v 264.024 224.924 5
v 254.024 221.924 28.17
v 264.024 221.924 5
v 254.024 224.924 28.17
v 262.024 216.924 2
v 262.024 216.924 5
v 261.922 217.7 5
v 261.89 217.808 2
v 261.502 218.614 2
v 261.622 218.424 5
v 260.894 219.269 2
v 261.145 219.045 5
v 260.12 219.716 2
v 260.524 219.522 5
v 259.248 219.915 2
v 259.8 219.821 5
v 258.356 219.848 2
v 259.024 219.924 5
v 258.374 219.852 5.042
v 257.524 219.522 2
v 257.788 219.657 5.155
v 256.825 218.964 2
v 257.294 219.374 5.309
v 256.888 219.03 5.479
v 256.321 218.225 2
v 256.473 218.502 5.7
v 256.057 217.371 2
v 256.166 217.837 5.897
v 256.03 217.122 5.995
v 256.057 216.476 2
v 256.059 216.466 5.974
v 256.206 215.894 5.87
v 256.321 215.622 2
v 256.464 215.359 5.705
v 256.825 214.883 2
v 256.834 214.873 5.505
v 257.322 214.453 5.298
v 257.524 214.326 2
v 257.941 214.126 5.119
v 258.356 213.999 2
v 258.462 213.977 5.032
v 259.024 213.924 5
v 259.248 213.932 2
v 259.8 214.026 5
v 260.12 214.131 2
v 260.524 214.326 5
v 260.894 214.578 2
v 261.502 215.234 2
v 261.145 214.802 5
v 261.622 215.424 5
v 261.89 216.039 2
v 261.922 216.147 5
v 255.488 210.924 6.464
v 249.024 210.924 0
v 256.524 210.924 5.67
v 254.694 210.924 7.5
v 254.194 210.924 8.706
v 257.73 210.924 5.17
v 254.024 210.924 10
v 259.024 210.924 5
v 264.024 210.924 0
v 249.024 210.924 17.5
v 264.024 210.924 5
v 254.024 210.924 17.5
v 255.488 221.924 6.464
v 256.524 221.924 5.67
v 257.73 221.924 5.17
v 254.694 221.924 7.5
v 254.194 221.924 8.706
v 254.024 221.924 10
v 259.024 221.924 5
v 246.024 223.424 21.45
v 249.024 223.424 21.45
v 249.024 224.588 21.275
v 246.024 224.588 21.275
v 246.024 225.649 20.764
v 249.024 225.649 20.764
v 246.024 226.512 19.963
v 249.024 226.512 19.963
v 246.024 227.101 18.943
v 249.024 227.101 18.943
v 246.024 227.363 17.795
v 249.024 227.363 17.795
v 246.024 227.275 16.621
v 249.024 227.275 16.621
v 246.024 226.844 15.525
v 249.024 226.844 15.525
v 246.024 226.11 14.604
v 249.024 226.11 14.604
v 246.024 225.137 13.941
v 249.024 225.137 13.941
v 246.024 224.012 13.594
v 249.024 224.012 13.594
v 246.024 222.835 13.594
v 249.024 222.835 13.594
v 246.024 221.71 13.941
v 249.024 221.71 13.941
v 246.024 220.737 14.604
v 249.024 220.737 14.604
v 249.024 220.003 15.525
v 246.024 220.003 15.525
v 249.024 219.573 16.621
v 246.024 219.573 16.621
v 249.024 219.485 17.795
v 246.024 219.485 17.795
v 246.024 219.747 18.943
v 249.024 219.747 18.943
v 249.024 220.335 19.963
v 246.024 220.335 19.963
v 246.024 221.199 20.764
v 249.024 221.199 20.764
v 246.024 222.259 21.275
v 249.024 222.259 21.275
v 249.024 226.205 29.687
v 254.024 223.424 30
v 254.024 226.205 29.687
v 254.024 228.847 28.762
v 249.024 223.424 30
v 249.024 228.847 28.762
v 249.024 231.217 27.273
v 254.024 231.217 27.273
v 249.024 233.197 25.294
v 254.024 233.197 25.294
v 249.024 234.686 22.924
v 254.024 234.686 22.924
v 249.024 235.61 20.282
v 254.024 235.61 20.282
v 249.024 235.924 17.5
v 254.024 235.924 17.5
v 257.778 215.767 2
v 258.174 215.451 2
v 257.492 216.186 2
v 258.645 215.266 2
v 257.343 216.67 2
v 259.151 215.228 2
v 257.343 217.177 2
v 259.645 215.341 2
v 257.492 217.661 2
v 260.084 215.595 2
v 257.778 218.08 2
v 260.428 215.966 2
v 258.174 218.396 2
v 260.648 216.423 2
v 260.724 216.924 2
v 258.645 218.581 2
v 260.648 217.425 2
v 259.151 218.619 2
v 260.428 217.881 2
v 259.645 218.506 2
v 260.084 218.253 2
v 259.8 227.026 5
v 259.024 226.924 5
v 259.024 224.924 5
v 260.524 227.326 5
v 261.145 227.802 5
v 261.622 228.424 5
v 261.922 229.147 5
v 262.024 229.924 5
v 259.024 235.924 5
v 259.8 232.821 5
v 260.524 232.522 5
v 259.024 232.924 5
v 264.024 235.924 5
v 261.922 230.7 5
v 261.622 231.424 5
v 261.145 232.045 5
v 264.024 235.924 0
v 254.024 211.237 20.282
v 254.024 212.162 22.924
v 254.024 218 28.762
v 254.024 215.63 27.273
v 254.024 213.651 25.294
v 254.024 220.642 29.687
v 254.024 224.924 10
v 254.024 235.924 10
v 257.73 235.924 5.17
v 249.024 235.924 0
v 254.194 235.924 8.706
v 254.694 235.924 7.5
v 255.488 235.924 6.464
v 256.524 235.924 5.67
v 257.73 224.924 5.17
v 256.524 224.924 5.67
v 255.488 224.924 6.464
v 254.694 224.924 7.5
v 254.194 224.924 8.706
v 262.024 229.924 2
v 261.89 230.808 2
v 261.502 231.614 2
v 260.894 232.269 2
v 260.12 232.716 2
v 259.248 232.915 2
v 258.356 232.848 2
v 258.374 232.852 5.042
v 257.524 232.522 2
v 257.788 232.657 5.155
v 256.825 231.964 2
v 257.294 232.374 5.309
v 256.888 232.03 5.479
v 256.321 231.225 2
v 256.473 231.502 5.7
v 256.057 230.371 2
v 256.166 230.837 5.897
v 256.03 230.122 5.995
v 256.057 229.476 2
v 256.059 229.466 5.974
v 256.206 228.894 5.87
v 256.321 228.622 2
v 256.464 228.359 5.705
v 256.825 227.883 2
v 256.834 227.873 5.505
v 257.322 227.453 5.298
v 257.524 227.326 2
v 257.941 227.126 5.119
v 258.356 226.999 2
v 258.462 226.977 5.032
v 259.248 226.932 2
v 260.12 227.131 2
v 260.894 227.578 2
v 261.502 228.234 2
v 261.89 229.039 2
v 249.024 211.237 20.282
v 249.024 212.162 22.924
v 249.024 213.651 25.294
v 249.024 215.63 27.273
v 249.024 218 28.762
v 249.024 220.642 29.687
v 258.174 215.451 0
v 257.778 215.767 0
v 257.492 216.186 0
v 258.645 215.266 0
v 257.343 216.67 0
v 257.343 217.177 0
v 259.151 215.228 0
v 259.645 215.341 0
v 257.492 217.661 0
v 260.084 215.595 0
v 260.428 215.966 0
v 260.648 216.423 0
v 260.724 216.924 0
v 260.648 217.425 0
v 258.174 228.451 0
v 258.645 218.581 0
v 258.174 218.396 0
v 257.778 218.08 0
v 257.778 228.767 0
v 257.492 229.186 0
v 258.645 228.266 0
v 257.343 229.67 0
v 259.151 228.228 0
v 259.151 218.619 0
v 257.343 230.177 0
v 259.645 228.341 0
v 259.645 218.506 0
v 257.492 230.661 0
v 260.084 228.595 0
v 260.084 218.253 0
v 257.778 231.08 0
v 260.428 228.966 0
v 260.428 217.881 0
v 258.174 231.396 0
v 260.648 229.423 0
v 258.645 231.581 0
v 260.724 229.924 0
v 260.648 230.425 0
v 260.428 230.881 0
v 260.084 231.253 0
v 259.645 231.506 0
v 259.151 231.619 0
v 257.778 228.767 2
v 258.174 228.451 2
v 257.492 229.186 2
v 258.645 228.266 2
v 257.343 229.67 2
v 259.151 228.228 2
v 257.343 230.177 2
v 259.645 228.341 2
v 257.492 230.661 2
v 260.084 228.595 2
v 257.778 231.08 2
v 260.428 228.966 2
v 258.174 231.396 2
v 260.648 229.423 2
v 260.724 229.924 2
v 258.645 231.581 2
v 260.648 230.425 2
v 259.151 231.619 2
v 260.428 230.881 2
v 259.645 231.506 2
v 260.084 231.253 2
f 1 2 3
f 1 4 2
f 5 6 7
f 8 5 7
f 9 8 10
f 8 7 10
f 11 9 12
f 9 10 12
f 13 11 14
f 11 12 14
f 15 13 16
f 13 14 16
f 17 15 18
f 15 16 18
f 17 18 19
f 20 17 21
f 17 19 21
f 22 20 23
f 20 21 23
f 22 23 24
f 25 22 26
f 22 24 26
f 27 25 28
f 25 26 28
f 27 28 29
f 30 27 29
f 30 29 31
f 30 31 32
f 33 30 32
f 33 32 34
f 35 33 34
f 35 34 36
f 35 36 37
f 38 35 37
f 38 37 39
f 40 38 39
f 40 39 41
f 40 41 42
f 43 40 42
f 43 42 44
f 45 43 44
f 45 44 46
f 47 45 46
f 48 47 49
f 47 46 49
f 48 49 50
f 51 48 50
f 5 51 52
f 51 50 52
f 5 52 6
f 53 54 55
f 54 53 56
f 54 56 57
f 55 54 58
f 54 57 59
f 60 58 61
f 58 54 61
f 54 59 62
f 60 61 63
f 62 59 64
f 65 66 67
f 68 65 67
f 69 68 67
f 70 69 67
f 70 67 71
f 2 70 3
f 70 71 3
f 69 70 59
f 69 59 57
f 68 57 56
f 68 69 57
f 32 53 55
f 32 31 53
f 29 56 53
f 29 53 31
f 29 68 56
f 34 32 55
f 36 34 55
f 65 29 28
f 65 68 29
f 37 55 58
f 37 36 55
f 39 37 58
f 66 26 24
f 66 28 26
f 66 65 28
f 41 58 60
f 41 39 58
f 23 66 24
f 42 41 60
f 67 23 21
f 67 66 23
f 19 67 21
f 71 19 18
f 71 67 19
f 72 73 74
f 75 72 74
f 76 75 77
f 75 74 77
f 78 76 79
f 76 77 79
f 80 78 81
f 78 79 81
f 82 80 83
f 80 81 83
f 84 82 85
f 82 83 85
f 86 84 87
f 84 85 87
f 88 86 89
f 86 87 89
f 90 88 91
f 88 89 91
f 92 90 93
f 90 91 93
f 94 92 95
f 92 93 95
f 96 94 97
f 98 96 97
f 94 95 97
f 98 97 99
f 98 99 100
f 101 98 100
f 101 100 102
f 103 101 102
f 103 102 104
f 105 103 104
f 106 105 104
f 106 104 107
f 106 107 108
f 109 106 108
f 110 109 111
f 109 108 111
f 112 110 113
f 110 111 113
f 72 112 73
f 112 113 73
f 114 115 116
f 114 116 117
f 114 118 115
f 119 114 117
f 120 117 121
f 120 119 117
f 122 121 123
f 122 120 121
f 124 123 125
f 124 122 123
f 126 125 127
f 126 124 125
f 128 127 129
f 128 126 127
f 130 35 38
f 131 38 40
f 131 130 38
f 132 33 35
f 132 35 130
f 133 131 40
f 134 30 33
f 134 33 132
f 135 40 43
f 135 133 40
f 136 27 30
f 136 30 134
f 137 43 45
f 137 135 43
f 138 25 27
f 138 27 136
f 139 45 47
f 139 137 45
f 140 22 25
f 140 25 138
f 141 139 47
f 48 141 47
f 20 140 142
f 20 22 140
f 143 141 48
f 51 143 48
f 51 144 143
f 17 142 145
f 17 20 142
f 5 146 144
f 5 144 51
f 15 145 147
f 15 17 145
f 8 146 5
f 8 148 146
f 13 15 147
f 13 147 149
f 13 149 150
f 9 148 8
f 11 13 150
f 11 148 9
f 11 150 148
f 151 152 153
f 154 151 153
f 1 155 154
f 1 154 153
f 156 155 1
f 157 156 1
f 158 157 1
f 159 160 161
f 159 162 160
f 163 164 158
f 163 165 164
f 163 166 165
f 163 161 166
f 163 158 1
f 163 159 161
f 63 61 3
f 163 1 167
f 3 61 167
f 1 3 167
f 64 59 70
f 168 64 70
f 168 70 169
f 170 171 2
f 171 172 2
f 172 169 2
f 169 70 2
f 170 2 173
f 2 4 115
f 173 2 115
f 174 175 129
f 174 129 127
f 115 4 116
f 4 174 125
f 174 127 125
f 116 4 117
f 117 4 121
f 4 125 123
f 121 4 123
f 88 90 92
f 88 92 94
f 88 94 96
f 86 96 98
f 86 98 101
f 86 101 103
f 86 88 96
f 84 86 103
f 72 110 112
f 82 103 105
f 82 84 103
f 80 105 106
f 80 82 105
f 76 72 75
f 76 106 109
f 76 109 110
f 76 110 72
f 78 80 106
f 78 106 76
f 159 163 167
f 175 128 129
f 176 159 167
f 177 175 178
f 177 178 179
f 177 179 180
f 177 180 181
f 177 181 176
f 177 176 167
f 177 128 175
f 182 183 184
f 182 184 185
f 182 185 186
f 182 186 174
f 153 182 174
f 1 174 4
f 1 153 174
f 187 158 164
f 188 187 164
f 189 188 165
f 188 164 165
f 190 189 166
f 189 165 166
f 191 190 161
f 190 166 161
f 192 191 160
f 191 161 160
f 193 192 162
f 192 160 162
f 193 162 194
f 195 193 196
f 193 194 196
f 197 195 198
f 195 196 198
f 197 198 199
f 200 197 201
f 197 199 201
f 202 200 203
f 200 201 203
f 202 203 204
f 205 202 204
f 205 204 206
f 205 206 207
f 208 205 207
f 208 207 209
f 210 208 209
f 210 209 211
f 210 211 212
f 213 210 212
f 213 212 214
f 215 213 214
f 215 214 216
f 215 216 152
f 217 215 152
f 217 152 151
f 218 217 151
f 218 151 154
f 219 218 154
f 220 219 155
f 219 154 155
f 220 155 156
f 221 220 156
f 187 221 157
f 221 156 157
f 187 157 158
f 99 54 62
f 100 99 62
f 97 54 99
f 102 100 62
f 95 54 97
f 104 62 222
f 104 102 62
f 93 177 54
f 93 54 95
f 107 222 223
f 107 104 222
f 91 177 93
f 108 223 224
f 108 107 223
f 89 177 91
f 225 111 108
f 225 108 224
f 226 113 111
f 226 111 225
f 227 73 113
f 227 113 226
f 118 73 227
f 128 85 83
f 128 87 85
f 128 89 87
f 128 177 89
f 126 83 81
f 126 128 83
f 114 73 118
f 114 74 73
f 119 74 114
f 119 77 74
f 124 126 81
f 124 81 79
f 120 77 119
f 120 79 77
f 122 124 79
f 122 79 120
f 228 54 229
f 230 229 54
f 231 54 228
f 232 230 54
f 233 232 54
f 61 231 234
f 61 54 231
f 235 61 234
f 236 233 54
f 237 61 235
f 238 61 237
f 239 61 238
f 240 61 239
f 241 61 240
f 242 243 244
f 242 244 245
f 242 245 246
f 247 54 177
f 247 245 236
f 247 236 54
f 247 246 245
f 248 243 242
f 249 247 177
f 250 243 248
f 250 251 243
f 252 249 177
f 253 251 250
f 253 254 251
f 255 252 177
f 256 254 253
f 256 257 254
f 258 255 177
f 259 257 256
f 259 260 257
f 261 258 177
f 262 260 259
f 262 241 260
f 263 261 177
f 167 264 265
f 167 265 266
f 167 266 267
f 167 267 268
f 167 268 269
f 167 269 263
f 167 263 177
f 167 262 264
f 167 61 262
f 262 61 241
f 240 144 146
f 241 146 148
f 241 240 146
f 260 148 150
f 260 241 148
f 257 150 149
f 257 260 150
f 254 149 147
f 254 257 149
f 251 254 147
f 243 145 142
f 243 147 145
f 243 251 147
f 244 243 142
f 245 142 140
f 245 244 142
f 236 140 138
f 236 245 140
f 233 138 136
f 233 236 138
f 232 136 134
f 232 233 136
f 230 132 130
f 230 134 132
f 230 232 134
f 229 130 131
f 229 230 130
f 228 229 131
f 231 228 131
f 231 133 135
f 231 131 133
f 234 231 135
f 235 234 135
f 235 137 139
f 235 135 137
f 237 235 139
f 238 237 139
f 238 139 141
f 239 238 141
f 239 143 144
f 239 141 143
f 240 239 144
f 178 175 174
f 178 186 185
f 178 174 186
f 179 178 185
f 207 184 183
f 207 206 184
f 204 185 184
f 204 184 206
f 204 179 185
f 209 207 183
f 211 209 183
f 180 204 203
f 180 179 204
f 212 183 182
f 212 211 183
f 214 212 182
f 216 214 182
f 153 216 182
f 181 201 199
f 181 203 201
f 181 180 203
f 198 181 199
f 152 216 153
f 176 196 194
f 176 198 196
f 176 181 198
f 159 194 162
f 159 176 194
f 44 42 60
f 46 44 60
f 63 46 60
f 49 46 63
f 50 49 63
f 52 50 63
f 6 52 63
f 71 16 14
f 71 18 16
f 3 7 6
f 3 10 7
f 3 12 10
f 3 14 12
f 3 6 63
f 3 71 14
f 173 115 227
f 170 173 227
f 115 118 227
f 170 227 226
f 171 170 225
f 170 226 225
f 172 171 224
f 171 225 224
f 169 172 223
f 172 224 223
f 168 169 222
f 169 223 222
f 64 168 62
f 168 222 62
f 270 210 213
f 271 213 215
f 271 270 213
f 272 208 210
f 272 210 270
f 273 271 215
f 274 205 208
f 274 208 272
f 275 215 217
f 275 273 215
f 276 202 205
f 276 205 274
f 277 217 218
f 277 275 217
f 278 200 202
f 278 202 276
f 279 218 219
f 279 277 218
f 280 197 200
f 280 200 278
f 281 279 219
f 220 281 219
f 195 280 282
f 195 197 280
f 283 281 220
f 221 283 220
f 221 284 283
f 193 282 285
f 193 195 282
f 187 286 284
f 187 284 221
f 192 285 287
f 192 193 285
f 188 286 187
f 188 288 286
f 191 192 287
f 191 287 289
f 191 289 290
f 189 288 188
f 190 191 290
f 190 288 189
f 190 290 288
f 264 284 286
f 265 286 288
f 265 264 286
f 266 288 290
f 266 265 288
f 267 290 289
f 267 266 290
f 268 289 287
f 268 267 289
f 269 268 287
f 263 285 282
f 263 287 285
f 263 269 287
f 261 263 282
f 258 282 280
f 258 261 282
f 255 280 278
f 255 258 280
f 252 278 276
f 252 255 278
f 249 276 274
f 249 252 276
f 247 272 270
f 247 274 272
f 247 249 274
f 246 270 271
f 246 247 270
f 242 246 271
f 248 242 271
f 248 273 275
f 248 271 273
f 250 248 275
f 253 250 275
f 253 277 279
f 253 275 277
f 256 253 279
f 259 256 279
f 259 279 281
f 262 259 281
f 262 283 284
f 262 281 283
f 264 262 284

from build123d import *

# Parameters (mm, degrees)
SKETCH1_W           = 10
SKETCH1_H           = 25
SKETCH1_R           = 1.7
BOSS_EXTRUDE1_DEPTH = 5
SKETCH2_W           = 25
SKETCH2_H           = 25
SKETCH2_W_2         = 5
BOSS_EXTRUDE2_DEPTH = 5
SKETCH3_R           = 3.95
BOSS_EXTRUDE3_DEPTH = 3
SKETCH4_R           = 3
CUT_EXTRUDE1_DEPTH  = 3
FILLET1_R           = 12.5
BOSS_EXTRUDE4_DEPTH = 1.5
FILLET2_R           = 5


# Some blends are built 0.0001 mm under size
with BuildPart() as part:
    # Sketch1 → Boss-Extrude1 (new body)
    with BuildSketch(Plane.XY):
        with Locations((259.023766163, 223.42362241)):
            Rectangle(SKETCH1_W, SKETCH1_H)
        with Locations((259.023766163, 229.92362241)):
            Circle(SKETCH1_R, mode=Mode.SUBTRACT)
        with Locations((259.023766163, 216.92362241)):
            Circle(SKETCH1_R, mode=Mode.SUBTRACT)
    extrude(amount=BOSS_EXTRUDE1_DEPTH)

    # Sketch2 → Boss-Extrude2 (add)
    with BuildSketch(Plane.ZY.offset(-254.023766163)):
        with Locations((17.5, 223.42362241)):
            Rectangle(SKETCH2_W, SKETCH2_H)
        with Locations((2.5, 223.42362241)):
            Rectangle(SKETCH2_W_2, SKETCH2_H)
    extrude(amount=BOSS_EXTRUDE2_DEPTH)

    # Sketch3 → Boss-Extrude3 (add)
    with BuildSketch(Plane.ZY.offset(-249.023766163)):
        with Locations((17.5, 223.42362241)):
            Circle(SKETCH3_R)
    extrude(amount=BOSS_EXTRUDE3_DEPTH)

    # Sketch4 → Cut-Extrude1 (cut)
    with BuildSketch(Plane.XY.offset(5)):
        with Locations((259.023766163, 216.92362241)):
            Circle(SKETCH4_R)
        with Locations((259.023766163, 229.92362241)):
            Circle(SKETCH4_R)
    extrude(amount=-CUT_EXTRUDE1_DEPTH, mode=Mode.SUBTRACT)

    # Fillet1
    fillet1_edges = [part.edges().sort_by_distance(p)[0] for p in [
        (251.523766163, 210.92362241, 30),
        (251.523766163, 235.92362241, 30),
    ]]
    fillet(fillet1_edges, radius=FILLET1_R - 0.0001)  # a hair under: the kernel refuses the full size

    # Sketch5 → Boss-Extrude4 (add, symmetric)
    with BuildSketch(Plane(origin=(0, 223.42362241, 0), x_dir=(1, 0, 0), z_dir=(0, 1, 0))):
        Polygon((254.023766163, -28.1700362), (264.023766163, -5), (254.023766163, -5), (254.023766163, -17.5), align=None)
    extrude(amount=BOSS_EXTRUDE4_DEPTH, both=True)

    # Fillet2
    # the kernel refuses this fillet: 5 mm, written as the material it adds along each edge
    with BuildSketch(Plane(origin=(254.023766163, 235.92362241, 5), x_dir=(0, 0, 1), z_dir=(0, -1, 0))) as fillet2_piece_1_section:
        with BuildLine():
            CenterArc((FILLET2_R, -FILLET2_R), FILLET2_R, 90, 90)
            Line((0, -FILLET2_R), (0, 0))
            Line((0, 0), (FILLET2_R, 0))
        make_face()
    fillet2_piece_1 = extrude(amount=23.5, mode=Mode.PRIVATE)
    fillet2_piece_1 = fillet2_piece_1 - Plane(origin=(259.023766163, 229.92362241, 6.20300882), x_dir=(1, 0, 0), z_dir=(0, 0, 1)) * Cylinder(3, 68, mode=Mode.PRIVATE)
    fillet2_piece_1 = fillet2_piece_1 - Plane(origin=(259.023766163, 216.92362241, 6.20300882), x_dir=(1, 0, 0), z_dir=(0, 0, 1)) * Cylinder(3, 68, mode=Mode.PRIVATE)
    add(fillet2_piece_1)
    with BuildSketch(Plane(origin=(254.023766163, 234.42362241, 5), x_dir=(0, 0, 1), z_dir=(0, -1, 0))) as fillet2_piece_2_section:
        with BuildLine():
            CenterArc((FILLET2_R, -FILLET2_R), FILLET2_R, 90, 90)
            Line((0, -FILLET2_R), (0, 0))
            Line((0, 0), (FILLET2_R, 0))
        make_face()
    fillet2_piece_2 = extrude(amount=23.5, mode=Mode.PRIVATE)
    fillet2_piece_2 = fillet2_piece_2 - Plane(origin=(259.023766163, 229.92362241, 6.193943695), x_dir=(1, 0, 0), z_dir=(0, 0, 1)) * Cylinder(3, 67, mode=Mode.PRIVATE)
    fillet2_piece_2 = fillet2_piece_2 - Plane(origin=(259.023766163, 216.92362241, 6.193943695), x_dir=(1, 0, 0), z_dir=(0, 0, 1)) * Cylinder(3, 67, mode=Mode.PRIVATE)
    add(fillet2_piece_2)


solid = part.part
